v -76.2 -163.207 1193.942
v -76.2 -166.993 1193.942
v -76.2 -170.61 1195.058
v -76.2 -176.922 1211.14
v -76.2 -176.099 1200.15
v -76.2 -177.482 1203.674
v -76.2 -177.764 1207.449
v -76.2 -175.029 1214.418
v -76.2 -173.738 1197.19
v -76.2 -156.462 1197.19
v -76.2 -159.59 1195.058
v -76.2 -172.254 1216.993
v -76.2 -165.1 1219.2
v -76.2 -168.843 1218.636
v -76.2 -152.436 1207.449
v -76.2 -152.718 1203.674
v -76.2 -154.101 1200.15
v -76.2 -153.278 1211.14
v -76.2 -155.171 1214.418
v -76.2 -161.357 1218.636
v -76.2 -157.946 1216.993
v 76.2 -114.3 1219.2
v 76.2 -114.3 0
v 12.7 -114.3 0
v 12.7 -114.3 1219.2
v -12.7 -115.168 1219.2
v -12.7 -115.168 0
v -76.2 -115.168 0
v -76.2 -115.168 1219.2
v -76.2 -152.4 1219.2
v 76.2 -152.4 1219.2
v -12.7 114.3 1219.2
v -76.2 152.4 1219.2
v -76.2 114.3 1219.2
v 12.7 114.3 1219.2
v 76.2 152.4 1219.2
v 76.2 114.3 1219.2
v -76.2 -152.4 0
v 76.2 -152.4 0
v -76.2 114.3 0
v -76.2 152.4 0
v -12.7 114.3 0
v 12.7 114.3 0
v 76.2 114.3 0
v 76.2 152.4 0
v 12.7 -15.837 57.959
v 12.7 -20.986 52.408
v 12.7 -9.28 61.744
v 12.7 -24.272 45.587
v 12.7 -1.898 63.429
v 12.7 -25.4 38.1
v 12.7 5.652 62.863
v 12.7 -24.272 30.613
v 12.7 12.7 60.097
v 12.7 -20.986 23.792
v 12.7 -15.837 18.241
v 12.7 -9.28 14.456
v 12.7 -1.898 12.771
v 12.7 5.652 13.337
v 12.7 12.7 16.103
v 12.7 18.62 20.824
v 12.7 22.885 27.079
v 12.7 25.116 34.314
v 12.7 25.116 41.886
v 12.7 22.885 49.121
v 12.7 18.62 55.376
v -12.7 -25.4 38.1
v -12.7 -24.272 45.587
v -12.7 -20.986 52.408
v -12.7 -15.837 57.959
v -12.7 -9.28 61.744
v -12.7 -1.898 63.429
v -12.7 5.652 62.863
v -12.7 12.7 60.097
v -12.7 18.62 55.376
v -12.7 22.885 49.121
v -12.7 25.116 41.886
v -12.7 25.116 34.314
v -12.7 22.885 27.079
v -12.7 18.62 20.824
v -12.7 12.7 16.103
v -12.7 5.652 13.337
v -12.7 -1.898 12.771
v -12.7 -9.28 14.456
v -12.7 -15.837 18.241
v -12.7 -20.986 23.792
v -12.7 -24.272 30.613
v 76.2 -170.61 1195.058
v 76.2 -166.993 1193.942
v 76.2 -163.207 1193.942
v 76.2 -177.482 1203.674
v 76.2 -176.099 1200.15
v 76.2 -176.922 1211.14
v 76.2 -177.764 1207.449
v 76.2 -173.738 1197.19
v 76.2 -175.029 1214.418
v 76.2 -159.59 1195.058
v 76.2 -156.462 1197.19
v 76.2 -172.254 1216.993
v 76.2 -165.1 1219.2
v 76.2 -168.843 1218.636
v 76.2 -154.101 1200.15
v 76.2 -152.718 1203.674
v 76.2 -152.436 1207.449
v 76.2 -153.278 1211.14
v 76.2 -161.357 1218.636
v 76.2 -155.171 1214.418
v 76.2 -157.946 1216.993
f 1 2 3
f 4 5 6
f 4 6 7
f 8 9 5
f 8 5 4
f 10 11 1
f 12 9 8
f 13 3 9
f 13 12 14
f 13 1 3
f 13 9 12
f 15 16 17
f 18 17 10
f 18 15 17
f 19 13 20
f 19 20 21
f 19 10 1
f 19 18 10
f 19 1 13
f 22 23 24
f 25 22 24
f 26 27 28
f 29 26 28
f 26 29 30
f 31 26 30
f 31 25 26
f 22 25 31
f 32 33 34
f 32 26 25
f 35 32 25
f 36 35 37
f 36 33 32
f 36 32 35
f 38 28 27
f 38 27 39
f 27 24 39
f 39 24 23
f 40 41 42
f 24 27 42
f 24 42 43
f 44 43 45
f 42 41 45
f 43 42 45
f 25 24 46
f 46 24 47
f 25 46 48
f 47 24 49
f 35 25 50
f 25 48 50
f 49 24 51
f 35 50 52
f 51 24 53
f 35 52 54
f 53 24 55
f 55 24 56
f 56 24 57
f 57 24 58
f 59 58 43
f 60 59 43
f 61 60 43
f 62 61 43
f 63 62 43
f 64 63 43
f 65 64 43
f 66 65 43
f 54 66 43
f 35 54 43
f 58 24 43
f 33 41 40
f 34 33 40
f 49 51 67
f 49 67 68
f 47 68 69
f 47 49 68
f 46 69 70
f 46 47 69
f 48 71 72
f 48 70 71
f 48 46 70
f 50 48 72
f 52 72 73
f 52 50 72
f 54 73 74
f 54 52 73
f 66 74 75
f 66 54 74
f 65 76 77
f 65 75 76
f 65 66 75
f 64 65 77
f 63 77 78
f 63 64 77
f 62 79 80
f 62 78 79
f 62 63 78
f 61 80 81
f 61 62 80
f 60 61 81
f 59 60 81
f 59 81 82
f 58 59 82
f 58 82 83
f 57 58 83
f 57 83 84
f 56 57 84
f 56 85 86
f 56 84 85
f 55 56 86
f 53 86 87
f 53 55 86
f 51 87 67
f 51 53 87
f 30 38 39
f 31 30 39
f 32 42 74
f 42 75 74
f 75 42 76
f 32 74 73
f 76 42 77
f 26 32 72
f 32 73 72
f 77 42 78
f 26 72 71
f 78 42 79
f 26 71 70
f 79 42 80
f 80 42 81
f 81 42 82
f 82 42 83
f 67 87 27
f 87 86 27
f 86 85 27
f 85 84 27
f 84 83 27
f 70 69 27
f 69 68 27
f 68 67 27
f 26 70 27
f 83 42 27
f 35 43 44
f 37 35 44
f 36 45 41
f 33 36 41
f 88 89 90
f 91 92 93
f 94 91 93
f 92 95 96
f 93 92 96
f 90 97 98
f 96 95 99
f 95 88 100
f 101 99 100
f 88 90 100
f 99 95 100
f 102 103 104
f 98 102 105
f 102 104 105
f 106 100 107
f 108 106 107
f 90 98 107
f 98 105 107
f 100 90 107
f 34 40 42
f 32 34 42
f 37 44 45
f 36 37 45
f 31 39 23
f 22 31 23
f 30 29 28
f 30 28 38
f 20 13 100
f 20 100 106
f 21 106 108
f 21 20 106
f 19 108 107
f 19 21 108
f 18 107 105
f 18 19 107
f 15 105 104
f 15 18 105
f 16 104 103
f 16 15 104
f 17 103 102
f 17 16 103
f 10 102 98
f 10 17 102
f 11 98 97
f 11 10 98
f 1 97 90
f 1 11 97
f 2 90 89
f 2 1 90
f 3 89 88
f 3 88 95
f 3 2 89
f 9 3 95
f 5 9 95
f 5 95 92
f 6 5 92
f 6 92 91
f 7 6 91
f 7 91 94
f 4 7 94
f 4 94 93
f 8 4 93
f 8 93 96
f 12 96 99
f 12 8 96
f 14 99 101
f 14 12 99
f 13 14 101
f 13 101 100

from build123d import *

# Parameters (mm, degrees)
BOSS_EXTRUDE1_DEPTH     = 1219.2
CUT_EXTRUDE1_DEPTH      = 11.43
CUT_EXTRUDE1_DEPTH_BACK = 41.148
SKETCH3_R               = 25.4
SKETCH4_R               = 12.7
BOSS_EXTRUDE2_DEPTH     = 152.4


with BuildPart() as part:
    # Sketch2 → Boss-Extrude1 (new body)
    with BuildSketch(Plane.XY):
        Polygon((-76.2, -152.4), (76.2, -152.4), (76.2, -114.3), (12.7, -114.3), (12.7, 114.3), (76.2, 114.3), (76.2, 152.4), (-76.2, 152.4), (-76.2, 114.3), (-12.7, 114.3), (-12.7, -115.168197492), (-76.2, -115.168197492), align=None)
    extrude(amount=BOSS_EXTRUDE1_DEPTH)

    # Sketch3 → Cut-Extrude1 (cut, two sides: drawn at the far end of the back side and taken through both)
    with BuildSketch(Plane.ZY.offset(12.7).offset(-CUT_EXTRUDE1_DEPTH_BACK)):
        with Locations(Location((38.1, 0, 0), (0, 0, 270))):
            Circle(SKETCH3_R)
    extrude(amount=CUT_EXTRUDE1_DEPTH + CUT_EXTRUDE1_DEPTH_BACK, mode=Mode.SUBTRACT)


with BuildPart() as body_2:
    # Sketch4 → Boss-Extrude2 (new body)
    with BuildSketch(Plane.ZY.offset(76.2)):
        with Locations((1206.5, -165.1)):
            Circle(SKETCH4_R)
    extrude(amount=-BOSS_EXTRUDE2_DEPTH)


solid = Compound([part.part, body_2.part])
